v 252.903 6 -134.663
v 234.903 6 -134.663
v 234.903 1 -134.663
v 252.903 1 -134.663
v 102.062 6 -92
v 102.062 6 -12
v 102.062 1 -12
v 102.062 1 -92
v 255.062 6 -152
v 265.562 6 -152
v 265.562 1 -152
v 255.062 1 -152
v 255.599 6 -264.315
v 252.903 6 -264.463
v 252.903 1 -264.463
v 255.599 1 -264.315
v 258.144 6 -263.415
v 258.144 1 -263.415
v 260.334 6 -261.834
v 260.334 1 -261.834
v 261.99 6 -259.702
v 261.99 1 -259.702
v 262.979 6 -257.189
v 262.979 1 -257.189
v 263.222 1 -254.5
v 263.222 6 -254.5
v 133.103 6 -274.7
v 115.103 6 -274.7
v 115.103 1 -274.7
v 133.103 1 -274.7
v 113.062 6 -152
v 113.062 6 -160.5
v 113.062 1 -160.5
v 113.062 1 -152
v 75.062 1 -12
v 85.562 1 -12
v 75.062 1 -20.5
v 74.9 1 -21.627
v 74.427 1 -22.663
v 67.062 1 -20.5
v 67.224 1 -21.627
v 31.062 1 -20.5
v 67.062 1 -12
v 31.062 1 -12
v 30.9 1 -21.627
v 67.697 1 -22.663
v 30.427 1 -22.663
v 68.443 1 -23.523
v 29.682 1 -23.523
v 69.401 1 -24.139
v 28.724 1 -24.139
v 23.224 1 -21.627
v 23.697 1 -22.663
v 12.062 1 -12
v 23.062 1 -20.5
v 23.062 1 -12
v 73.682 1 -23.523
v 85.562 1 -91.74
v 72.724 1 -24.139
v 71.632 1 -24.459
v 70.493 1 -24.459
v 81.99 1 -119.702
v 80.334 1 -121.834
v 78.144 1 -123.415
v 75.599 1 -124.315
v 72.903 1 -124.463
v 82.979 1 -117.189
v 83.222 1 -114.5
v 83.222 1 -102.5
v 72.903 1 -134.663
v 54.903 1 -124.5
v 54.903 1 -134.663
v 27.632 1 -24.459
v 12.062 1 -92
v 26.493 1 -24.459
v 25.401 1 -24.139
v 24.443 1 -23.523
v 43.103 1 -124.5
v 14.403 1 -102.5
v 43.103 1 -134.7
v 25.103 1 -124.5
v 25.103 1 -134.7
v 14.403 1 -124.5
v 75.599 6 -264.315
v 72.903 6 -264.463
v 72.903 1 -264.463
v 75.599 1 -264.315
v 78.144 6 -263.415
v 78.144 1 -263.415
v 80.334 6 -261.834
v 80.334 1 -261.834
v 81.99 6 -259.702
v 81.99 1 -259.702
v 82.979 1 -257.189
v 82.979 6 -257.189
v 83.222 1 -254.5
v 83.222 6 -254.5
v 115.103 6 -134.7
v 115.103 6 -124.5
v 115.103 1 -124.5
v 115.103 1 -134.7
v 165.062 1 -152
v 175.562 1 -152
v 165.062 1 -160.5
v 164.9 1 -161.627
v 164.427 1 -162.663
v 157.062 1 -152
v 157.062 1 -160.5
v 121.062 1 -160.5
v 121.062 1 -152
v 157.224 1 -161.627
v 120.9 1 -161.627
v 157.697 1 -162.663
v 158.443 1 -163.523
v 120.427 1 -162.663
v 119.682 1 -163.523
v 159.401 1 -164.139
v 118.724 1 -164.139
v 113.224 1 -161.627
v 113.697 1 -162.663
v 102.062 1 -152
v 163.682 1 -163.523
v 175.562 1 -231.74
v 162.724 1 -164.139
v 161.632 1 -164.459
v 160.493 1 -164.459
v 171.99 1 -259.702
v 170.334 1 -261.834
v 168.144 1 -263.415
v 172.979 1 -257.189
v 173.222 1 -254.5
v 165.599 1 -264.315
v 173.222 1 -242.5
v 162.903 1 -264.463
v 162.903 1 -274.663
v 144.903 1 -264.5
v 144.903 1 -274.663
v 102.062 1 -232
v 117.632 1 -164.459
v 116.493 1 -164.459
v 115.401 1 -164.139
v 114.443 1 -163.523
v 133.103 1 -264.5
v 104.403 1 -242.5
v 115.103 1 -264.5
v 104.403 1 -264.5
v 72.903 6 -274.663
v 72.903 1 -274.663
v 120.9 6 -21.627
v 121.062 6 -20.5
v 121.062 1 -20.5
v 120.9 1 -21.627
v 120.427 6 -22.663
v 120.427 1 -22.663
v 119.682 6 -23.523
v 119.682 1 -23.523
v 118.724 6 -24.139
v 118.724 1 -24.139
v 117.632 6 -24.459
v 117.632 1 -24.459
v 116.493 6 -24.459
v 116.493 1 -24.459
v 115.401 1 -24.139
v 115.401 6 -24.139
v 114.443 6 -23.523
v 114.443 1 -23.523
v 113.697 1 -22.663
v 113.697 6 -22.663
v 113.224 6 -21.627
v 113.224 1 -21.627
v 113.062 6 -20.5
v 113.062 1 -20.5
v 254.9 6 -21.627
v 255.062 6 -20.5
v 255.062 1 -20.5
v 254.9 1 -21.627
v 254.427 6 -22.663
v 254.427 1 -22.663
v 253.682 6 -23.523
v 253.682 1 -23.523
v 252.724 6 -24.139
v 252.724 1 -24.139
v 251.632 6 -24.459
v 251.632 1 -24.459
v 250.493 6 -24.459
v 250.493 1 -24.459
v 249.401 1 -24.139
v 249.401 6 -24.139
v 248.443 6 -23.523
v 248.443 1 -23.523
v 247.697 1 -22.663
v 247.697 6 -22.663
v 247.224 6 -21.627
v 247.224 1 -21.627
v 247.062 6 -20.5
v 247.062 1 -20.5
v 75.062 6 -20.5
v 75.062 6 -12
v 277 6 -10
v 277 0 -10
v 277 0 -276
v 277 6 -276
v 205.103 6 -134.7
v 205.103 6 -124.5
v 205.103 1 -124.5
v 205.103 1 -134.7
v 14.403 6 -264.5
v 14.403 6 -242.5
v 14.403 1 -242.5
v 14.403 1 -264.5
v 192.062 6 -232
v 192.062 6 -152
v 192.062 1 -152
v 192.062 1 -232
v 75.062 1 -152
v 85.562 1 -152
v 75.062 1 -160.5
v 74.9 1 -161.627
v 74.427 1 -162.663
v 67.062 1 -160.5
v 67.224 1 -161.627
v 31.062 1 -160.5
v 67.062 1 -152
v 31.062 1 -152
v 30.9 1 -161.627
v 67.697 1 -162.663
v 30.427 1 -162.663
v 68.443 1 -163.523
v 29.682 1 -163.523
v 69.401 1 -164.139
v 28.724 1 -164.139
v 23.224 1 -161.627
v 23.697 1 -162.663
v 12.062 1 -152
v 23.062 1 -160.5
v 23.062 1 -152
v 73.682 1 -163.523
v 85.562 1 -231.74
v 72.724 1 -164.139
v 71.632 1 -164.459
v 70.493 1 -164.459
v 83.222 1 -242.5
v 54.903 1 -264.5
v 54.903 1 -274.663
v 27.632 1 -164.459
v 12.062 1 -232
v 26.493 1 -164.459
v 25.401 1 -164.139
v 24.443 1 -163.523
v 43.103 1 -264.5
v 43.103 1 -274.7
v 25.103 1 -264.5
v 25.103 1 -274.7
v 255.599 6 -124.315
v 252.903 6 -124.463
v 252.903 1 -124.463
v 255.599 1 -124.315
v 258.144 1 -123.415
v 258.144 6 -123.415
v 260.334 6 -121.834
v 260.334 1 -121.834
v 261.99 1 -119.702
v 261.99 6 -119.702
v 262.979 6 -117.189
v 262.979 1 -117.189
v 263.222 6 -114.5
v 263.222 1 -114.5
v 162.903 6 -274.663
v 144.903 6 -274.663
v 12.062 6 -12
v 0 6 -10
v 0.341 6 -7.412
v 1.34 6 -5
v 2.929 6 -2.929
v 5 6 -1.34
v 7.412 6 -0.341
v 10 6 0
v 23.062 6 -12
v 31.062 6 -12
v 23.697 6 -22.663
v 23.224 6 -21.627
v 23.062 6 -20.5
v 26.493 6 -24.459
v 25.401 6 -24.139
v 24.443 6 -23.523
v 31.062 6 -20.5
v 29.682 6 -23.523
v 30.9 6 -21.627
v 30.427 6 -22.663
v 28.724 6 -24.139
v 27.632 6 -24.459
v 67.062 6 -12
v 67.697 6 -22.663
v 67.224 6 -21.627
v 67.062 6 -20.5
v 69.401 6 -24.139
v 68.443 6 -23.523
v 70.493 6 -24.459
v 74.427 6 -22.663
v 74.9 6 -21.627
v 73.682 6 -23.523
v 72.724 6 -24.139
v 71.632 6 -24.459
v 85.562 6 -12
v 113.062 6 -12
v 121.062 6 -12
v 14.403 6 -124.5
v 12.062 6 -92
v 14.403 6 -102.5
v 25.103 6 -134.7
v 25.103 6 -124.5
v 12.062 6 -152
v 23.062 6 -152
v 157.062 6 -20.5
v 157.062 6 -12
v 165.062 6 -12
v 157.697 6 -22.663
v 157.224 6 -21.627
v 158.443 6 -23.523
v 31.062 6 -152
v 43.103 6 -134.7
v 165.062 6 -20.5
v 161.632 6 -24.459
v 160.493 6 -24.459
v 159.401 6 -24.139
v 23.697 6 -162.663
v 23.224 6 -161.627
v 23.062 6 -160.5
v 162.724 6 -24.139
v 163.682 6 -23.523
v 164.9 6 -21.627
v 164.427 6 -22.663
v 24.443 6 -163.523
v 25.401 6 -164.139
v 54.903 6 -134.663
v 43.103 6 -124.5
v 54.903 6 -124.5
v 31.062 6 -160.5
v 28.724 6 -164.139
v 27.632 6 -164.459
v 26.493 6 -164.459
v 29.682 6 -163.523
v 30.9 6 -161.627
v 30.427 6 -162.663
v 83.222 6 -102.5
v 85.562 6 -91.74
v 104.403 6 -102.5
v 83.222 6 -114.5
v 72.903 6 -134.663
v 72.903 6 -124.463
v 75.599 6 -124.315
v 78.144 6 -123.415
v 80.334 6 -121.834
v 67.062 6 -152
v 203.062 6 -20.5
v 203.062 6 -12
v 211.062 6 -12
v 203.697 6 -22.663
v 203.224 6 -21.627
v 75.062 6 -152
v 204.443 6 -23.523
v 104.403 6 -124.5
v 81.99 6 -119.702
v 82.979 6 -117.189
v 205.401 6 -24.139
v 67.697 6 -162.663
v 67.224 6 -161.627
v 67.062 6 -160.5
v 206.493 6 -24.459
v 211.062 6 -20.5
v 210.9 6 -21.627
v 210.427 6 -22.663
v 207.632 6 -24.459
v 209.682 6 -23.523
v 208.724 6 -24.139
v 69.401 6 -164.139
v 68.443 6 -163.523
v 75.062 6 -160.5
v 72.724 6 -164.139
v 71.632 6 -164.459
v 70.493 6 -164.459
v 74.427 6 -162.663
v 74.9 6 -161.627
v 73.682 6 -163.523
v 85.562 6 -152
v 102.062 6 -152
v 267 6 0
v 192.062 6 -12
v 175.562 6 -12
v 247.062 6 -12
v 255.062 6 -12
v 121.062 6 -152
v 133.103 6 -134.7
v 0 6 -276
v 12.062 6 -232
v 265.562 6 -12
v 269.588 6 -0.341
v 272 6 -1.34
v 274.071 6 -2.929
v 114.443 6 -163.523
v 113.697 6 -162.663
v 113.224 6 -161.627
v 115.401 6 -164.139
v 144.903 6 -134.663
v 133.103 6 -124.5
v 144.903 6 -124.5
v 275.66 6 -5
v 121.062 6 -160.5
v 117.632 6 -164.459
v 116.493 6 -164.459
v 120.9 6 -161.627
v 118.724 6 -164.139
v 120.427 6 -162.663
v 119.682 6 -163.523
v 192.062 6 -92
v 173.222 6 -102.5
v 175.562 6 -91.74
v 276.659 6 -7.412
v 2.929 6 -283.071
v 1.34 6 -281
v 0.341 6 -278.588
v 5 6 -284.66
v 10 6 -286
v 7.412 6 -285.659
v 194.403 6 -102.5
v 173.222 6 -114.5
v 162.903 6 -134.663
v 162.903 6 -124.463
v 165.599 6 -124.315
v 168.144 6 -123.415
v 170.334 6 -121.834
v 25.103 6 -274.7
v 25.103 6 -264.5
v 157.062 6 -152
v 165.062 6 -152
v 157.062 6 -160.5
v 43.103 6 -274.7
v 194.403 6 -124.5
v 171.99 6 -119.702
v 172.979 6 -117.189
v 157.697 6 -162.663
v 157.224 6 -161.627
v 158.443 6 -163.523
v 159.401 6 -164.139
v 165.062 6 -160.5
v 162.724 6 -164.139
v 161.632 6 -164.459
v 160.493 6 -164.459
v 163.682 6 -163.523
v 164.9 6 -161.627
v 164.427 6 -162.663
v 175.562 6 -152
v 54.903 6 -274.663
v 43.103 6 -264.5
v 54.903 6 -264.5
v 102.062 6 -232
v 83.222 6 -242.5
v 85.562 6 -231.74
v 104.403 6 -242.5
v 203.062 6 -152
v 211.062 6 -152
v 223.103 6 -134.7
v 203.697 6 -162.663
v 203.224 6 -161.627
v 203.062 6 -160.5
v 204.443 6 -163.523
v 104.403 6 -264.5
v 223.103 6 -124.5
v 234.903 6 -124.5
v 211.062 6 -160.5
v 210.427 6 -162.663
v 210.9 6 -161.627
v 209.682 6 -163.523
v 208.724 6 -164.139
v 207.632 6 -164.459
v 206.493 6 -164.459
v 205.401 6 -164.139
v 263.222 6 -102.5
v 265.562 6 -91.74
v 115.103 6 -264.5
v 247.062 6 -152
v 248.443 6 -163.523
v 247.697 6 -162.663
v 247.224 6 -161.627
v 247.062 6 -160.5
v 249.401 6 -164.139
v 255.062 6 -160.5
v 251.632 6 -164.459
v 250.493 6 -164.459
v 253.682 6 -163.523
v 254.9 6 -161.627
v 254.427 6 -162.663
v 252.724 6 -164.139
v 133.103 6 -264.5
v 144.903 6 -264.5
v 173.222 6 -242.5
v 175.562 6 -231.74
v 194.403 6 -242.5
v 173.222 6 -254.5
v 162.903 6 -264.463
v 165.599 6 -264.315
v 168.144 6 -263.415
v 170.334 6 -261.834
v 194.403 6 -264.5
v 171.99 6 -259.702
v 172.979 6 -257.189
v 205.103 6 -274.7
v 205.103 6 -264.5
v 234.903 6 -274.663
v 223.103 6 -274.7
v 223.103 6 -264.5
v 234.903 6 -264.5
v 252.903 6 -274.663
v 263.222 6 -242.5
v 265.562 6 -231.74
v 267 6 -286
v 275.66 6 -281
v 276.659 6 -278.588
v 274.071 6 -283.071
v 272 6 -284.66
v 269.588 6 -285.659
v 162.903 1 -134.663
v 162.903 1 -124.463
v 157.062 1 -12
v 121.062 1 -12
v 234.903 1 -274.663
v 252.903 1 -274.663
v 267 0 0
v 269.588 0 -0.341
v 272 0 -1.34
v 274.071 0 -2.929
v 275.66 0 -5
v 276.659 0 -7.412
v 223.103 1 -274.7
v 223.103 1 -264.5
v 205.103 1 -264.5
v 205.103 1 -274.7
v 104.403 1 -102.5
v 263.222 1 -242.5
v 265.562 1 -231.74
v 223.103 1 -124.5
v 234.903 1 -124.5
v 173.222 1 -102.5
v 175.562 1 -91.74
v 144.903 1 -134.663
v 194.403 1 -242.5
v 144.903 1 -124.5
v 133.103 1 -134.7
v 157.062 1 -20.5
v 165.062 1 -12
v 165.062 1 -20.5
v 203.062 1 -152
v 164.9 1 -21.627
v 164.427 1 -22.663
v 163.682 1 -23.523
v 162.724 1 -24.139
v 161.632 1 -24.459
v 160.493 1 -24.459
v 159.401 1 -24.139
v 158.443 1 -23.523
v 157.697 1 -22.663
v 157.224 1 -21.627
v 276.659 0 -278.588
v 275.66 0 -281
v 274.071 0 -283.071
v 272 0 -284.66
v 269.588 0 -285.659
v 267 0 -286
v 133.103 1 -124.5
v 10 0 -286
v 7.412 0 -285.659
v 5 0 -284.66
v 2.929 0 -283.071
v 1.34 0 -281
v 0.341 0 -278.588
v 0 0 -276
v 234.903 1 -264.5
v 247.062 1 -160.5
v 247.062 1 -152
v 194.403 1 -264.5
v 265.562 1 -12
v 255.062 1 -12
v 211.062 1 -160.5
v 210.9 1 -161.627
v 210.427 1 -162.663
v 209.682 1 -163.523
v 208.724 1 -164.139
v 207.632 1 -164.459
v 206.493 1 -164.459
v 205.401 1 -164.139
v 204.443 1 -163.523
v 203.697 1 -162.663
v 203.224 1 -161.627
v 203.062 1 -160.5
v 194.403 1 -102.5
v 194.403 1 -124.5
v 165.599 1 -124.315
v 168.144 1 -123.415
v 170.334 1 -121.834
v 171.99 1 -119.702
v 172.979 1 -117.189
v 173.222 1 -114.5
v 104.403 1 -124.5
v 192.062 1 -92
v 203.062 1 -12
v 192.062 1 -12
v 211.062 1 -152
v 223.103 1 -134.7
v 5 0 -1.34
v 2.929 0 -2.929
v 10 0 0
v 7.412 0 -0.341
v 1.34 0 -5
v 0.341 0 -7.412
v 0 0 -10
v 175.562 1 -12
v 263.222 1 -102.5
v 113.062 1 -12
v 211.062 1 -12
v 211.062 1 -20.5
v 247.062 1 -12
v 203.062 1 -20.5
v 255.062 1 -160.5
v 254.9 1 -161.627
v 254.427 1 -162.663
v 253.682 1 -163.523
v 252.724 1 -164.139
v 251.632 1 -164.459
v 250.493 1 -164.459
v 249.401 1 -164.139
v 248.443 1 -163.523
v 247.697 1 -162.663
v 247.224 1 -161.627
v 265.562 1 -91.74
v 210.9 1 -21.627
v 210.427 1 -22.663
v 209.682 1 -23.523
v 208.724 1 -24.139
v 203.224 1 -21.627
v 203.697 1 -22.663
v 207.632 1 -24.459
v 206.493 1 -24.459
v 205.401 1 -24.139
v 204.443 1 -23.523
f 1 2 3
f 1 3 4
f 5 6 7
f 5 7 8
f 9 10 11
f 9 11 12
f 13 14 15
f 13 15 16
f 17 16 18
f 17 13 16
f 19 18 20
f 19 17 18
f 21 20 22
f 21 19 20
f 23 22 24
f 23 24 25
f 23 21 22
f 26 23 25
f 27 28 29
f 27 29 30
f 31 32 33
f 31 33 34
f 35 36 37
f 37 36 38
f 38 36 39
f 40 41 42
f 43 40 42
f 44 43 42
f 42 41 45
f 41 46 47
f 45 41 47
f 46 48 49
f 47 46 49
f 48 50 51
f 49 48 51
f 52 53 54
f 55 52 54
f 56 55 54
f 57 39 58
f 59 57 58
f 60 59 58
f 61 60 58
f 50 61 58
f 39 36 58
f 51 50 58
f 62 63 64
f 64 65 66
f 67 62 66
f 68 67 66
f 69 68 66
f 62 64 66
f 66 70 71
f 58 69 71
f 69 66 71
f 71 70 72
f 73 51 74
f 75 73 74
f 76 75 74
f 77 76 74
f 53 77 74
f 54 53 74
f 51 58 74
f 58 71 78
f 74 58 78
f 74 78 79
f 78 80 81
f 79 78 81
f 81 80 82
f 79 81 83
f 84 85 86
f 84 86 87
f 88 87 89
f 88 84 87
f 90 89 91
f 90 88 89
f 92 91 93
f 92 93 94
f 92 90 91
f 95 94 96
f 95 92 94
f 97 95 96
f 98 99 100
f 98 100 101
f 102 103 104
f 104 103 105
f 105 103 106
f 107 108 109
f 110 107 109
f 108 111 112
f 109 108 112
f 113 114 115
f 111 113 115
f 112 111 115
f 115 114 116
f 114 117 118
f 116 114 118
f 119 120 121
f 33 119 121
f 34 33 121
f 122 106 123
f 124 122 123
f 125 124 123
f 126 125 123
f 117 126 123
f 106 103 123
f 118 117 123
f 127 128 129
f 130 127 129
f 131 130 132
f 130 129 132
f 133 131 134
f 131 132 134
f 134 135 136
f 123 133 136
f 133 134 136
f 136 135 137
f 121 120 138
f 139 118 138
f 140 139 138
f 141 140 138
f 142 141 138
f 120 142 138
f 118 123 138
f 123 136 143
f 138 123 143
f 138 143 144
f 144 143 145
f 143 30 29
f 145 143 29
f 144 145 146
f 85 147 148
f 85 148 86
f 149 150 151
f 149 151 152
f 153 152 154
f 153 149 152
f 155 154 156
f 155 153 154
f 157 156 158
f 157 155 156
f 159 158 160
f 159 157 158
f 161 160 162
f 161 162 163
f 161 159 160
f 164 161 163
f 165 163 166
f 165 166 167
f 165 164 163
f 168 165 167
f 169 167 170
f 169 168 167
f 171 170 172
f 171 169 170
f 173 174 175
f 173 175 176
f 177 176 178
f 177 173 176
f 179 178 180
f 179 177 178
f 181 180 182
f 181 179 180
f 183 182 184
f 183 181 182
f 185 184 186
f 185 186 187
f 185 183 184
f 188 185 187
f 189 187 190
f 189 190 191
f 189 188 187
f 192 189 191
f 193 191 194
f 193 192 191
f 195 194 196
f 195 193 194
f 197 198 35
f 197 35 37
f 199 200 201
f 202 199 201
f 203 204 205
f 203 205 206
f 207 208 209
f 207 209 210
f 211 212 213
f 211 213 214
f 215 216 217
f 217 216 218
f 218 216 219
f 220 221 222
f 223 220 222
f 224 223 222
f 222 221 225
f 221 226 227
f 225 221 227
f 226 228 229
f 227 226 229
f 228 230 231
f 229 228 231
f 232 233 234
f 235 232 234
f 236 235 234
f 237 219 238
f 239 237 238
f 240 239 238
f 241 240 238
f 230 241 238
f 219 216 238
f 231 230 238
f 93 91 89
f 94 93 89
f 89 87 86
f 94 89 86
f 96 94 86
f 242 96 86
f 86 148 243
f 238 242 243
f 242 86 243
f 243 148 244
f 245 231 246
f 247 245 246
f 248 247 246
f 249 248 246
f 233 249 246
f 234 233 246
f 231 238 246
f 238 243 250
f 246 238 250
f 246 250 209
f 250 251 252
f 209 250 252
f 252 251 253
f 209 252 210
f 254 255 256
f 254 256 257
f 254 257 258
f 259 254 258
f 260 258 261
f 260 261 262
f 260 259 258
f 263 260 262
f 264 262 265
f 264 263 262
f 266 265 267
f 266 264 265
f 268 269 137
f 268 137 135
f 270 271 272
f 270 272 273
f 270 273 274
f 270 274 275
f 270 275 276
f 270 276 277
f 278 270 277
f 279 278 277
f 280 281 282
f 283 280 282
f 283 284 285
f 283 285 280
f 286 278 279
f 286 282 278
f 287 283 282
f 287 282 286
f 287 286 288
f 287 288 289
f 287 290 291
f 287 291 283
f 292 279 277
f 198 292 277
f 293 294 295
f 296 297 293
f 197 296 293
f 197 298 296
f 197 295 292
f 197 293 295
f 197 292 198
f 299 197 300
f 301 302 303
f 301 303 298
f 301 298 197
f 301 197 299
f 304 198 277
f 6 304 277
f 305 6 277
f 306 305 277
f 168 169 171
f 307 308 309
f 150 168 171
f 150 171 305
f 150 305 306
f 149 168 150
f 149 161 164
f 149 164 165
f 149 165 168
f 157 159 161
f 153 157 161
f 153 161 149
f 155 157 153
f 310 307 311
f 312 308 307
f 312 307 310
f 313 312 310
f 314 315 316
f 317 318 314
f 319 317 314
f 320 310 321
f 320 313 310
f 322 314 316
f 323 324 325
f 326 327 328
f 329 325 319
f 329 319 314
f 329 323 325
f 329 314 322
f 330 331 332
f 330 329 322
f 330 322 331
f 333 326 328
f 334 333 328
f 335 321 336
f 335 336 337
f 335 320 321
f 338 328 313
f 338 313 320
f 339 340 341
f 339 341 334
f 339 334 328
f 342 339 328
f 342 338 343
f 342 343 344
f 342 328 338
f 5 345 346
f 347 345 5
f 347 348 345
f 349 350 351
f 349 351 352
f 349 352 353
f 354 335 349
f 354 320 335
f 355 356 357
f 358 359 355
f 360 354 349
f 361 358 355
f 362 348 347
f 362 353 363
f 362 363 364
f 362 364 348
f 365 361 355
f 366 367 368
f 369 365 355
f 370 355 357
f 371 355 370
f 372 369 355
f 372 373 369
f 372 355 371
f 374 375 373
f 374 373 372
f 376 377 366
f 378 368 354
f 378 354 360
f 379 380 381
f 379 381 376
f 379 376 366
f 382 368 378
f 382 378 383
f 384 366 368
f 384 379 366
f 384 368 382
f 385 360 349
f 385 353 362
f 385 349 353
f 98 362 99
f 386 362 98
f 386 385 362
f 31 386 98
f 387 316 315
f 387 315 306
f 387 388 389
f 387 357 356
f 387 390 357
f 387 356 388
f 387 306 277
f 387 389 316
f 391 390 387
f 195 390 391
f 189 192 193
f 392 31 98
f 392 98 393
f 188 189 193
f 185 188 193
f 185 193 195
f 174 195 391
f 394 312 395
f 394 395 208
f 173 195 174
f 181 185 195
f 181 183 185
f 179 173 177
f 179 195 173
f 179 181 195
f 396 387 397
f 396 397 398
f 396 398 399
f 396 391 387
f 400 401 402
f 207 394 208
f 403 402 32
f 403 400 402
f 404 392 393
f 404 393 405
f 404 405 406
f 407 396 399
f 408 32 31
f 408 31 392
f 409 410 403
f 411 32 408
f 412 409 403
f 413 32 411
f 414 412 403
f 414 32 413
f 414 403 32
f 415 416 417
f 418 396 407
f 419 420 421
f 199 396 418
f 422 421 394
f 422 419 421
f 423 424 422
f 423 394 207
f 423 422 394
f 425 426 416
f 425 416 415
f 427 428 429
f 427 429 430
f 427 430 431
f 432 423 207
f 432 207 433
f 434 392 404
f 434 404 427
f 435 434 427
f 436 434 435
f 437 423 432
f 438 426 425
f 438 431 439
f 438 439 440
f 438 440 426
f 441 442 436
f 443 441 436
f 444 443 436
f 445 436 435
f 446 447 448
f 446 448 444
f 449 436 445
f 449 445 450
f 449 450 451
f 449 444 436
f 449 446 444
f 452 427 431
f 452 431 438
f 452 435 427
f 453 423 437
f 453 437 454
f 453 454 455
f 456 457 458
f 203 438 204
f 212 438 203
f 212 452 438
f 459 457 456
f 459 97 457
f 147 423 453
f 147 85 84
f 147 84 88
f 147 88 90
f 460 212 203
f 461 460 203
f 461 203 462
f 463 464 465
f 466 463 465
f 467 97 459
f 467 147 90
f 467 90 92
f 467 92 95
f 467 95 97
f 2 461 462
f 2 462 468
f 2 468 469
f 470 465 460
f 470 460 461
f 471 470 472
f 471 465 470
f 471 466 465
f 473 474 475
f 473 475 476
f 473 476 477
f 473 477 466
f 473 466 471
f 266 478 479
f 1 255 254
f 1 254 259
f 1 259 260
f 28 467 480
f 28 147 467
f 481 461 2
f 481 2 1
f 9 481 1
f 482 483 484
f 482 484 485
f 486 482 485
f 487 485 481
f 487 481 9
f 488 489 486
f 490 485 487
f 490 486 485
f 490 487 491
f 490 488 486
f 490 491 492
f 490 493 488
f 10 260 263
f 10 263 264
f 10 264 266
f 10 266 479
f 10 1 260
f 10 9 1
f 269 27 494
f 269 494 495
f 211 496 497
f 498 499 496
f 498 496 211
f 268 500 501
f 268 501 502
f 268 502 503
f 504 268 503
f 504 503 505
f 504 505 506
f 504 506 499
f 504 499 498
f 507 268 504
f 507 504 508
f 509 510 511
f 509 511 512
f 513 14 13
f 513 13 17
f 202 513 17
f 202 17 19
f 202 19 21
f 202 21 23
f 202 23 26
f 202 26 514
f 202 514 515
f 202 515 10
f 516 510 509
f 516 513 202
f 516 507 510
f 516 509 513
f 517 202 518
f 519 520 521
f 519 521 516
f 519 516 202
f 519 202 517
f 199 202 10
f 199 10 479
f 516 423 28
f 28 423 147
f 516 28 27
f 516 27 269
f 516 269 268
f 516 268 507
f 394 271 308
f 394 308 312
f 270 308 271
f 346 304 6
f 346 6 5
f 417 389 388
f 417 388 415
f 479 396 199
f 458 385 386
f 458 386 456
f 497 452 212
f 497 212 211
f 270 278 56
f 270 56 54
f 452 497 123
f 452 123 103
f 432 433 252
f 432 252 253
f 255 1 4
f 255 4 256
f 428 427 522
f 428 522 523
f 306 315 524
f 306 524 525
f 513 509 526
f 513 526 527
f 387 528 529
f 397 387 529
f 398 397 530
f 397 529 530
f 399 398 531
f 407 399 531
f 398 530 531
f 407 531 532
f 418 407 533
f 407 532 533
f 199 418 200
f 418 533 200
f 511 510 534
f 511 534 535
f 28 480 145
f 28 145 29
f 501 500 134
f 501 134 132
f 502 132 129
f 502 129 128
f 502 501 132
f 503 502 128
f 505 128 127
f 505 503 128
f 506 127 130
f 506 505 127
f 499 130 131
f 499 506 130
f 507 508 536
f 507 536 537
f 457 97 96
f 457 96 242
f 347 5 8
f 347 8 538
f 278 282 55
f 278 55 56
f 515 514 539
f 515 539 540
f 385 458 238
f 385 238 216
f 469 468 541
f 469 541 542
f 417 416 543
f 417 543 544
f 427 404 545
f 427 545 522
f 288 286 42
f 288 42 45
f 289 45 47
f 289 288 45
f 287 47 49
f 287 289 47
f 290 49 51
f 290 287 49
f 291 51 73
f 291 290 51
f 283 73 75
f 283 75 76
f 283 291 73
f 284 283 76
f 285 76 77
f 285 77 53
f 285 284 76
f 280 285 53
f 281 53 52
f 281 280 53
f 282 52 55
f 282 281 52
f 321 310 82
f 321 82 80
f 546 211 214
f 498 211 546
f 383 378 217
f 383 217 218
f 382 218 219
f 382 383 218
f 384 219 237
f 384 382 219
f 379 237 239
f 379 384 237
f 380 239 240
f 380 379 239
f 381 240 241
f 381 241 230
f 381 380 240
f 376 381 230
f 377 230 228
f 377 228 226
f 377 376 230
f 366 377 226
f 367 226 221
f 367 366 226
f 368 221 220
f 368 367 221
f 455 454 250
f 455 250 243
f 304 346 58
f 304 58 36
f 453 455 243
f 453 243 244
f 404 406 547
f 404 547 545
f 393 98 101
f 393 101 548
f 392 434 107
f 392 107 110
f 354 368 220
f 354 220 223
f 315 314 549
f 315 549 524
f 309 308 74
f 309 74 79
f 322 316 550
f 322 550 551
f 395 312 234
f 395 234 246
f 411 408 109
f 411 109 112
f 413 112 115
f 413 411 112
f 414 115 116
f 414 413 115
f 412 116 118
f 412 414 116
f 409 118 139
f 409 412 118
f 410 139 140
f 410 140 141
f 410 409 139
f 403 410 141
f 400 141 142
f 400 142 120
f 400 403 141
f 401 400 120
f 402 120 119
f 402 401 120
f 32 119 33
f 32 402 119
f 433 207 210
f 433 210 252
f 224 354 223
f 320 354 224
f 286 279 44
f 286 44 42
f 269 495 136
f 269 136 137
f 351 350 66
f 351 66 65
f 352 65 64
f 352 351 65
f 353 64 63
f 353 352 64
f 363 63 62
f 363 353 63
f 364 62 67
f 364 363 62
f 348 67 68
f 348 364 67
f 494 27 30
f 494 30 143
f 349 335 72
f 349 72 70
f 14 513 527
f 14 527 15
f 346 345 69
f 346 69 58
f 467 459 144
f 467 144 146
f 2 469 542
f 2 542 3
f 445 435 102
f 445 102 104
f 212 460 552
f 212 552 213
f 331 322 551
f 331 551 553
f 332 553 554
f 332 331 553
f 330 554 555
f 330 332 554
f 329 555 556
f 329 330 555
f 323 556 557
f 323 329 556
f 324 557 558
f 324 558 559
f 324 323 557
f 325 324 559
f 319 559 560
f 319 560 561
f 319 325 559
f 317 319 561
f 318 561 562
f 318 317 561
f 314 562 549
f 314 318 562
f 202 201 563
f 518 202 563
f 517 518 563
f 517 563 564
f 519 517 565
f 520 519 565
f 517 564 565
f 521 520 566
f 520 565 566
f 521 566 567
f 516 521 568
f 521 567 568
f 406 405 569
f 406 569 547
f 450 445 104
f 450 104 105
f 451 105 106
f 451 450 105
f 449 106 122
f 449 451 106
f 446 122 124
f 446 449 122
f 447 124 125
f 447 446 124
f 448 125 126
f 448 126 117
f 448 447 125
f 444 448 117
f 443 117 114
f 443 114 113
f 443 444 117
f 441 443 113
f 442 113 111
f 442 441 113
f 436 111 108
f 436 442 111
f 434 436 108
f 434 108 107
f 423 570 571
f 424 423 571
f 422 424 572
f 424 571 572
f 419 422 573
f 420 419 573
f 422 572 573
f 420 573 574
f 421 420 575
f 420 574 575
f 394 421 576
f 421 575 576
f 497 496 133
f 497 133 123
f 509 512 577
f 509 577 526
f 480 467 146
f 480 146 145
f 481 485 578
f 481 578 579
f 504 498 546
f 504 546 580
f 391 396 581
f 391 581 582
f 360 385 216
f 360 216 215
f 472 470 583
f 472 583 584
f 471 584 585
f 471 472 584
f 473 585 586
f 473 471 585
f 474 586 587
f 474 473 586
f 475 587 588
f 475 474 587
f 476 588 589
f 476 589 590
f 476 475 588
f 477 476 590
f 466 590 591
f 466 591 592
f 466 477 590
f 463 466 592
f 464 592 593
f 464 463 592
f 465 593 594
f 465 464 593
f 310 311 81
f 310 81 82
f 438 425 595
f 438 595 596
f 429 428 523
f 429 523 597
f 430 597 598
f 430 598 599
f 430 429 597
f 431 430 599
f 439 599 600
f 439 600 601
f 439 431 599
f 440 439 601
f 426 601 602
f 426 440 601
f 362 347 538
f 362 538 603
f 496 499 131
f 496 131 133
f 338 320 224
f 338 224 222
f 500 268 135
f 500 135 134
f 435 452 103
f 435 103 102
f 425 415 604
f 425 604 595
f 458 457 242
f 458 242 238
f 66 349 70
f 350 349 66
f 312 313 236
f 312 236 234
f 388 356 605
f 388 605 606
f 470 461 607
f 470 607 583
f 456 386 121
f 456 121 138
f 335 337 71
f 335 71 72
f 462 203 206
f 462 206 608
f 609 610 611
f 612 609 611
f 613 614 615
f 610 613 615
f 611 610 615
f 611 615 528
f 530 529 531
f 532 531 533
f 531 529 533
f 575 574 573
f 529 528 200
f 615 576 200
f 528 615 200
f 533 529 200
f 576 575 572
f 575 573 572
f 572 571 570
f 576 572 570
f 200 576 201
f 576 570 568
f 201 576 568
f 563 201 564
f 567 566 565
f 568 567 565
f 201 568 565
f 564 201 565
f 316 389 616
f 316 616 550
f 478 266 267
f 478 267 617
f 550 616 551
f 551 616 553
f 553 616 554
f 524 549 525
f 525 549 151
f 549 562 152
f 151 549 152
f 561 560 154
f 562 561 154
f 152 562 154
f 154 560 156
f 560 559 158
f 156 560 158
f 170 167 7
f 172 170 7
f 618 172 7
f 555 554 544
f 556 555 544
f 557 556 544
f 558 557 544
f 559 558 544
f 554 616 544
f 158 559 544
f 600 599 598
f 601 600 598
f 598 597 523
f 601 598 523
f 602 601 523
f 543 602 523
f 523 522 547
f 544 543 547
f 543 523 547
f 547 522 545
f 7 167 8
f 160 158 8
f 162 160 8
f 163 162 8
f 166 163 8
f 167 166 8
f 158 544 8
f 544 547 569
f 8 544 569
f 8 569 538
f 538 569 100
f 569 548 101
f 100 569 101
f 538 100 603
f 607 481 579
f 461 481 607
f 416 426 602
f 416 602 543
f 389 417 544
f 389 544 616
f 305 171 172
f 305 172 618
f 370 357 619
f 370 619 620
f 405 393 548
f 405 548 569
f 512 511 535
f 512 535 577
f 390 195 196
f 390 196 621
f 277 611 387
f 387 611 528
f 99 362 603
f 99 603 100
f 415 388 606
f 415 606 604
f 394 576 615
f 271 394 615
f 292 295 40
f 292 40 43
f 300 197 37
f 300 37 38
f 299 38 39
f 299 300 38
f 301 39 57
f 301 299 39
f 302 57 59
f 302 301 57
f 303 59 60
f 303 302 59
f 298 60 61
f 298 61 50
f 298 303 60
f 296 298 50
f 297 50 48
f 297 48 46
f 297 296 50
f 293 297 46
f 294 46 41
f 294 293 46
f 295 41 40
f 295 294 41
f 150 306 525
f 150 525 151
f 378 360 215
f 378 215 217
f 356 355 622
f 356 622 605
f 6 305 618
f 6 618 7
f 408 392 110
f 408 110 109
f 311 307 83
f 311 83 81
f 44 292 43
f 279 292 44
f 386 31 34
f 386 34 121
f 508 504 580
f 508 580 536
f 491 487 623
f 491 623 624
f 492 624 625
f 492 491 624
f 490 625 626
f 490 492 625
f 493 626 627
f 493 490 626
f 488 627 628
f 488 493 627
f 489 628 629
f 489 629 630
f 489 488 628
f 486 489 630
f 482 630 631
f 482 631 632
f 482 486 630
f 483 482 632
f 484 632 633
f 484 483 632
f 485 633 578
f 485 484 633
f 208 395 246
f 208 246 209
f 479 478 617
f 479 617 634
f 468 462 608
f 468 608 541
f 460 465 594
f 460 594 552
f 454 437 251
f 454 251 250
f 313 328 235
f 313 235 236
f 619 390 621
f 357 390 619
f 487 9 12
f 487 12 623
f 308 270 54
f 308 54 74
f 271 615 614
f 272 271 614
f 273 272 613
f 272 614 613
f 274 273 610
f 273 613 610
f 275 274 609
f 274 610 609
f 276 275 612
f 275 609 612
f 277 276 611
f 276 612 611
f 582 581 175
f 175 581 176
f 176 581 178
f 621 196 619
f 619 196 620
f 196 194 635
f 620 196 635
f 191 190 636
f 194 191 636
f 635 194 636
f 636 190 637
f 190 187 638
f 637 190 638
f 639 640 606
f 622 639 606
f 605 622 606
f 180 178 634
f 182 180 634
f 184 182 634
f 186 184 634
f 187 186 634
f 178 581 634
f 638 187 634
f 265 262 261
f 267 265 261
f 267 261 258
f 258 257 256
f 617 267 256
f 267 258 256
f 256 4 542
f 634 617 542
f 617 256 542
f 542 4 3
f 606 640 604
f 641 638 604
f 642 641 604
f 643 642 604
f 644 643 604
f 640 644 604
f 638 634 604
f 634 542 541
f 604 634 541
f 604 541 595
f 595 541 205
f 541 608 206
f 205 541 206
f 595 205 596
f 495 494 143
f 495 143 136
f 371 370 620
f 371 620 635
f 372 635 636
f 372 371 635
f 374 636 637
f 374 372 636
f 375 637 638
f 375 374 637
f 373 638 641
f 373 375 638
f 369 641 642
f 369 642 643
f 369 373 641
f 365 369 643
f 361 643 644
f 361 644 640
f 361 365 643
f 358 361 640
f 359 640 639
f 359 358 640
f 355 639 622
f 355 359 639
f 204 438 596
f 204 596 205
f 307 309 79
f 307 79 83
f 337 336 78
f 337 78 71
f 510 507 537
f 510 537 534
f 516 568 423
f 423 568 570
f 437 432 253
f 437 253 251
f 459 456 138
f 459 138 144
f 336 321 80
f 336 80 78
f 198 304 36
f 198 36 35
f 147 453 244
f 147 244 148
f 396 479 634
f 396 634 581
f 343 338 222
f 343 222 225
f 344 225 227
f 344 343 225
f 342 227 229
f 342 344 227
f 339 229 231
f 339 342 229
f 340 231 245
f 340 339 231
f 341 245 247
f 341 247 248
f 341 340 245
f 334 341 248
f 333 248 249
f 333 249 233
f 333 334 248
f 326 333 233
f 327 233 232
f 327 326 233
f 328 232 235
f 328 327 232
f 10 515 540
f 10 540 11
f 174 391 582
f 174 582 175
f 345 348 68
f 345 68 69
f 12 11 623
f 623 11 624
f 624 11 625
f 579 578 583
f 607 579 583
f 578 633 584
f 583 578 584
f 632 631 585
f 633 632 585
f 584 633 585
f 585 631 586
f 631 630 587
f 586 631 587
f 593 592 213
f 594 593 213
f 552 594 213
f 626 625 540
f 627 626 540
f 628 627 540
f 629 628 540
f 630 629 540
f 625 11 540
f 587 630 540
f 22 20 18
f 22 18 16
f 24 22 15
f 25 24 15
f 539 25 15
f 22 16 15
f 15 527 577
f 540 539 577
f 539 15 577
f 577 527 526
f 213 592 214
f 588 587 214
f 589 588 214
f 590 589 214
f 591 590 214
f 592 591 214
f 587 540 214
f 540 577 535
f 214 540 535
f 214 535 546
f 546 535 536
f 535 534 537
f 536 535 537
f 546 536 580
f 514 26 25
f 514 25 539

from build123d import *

# Parameters (mm, degrees)
BOSS_EXTRUDE1_DEPTH = 6
CUT_EXTRUDE1_DEPTH  = 5


with BuildPart() as part:
    # Sketch1 → Boss-Extrude1 (new body)
    with BuildSketch(Plane(origin=(0, 0, 0), x_dir=(1, 0, 0), z_dir=(0, 1, 0))):
        with BuildLine():
            Line((10, 0), (267, 0))
            ThreePointArc((267, 0), (274.071067812, 2.928932188), (277, 10))
            Line((277, 10), (277, 276))
            ThreePointArc((277, 276), (274.071067812, 283.071067812), (267, 286))
            Line((267, 286), (10, 286))
            ThreePointArc((10, 286), (2.928932188, 283.071067812), (0, 276))
            Line((0, 276), (0, 10))
            ThreePointArc((0, 10), (2.928932188, 2.928932188), (10, 0))
        make_face()
    extrude(amount=BOSS_EXTRUDE1_DEPTH)

    # Sketch2 → Cut-Extrude1 (cut)
    with BuildSketch(Plane(origin=(0, 6, 0), x_dir=(1, 0, 0), z_dir=(0, 1, 0))):
        with BuildLine():
            Line((12.062245302, 92), (14.402743297, 102.5))
            Line((14.402743297, 102.5), (14.402743297, 124.5))
            Line((14.402743297, 124.5), (25.102743297, 124.5))
            Line((25.102743297, 124.5), (25.102743297, 134.7))
            Line((25.102743297, 134.7), (43.102743297, 134.7))
            Line((43.102743297, 134.7), (43.102743297, 124.5))
            Line((43.102743297, 124.5), (54.902731898, 124.5))
            Line((54.902731898, 124.5), (54.902731898, 134.663480988))
            Line((54.902731898, 134.663480988), (72.902731898, 134.663480988))
            Line((72.902731898, 134.663480988), (72.902731898, 124.463480988))
            ThreePointArc((72.902731898, 124.463480988), (80.333662874, 121.834216678), (83.221747307, 114.5))
            Line((83.221747307, 114.5), (83.221747307, 102.5))
            Line((83.221747307, 102.5), (85.562245302, 91.74))
            Line((85.562245302, 91.74), (85.562245302, 12))
            Line((85.562245302, 12), (75.062245302, 12))
            Line((75.062245302, 12), (75.062245302, 20.5))
            ThreePointArc((75.062245302, 20.5), (71.062245302, 24.5), (67.062245302, 20.5))
            Line((67.062245302, 20.5), (67.062245302, 12))
            Line((67.062245302, 12), (31.062245302, 12))
            Line((31.062245302, 12), (31.062245302, 20.5))
            ThreePointArc((31.062245302, 20.5), (27.062245302, 24.5), (23.062245302, 20.5))
            Line((23.062245302, 20.5), (23.062245302, 12))
            Line((23.062245302, 12), (12.062245302, 12))
            Line((12.062245302, 12), (12.062245302, 92))
        make_face()
        with BuildLine():
            Line((102.062245302, 92), (104.402743297, 102.5))
            Line((104.402743297, 102.5), (104.402743297, 124.5))
            Line((104.402743297, 124.5), (115.102743297, 124.5))
            Line((115.102743297, 124.5), (115.102743297, 134.7))
            Line((115.102743297, 134.7), (133.102743297, 134.7))
            Line((133.102743297, 134.7), (133.102743297, 124.5))
            Line((133.102743297, 124.5), (144.902731898, 124.5))
            Line((144.902731898, 124.5), (144.902731898, 134.663480988))
            Line((144.902731898, 134.663480988), (162.902731898, 134.663480988))
            Line((162.902731898, 134.663480988), (162.902731898, 124.463480988))
            ThreePointArc((162.902731898, 124.463480988), (170.333662874, 121.834216678), (173.221747307, 114.5))
            Line((173.221747307, 114.5), (173.221747307, 102.5))
            Line((173.221747307, 102.5), (175.562245302, 91.74))
            Line((175.562245302, 91.74), (175.562245302, 12))
            Line((175.562245302, 12), (165.062245302, 12))
            Line((165.062245302, 12), (165.062245302, 20.5))
            ThreePointArc((165.062245302, 20.5), (161.062245302, 24.5), (157.062245302, 20.5))
            Line((157.062245302, 20.5), (157.062245302, 12))
            Line((157.062245302, 12), (121.062245302, 12))
            Line((121.062245302, 12), (121.062245302, 20.5))
            ThreePointArc((121.062245302, 20.5), (117.062245302, 24.5), (113.062245302, 20.5))
            Line((113.062245302, 20.5), (113.062245302, 12))
            Line((113.062245302, 12), (102.062245302, 12))
            Line((102.062245302, 12), (102.062245302, 92))
        make_face()
        with BuildLine():
            Line((192.062245302, 92), (194.402743297, 102.5))
            Line((194.402743297, 102.5), (194.402743297, 124.5))
            Line((194.402743297, 124.5), (205.102743297, 124.5))
            Line((205.102743297, 124.5), (205.102743297, 134.7))
            Line((205.102743297, 134.7), (223.102743297, 134.7))
            Line((223.102743297, 134.7), (223.102743297, 124.5))
            Line((223.102743297, 124.5), (234.902731898, 124.5))
            Line((234.902731898, 124.5), (234.902731898, 134.663480988))
            Line((234.902731898, 134.663480988), (252.902731898, 134.663480988))
            Line((252.902731898, 134.663480988), (252.902731898, 124.463480988))
            ThreePointArc((252.902731898, 124.463480988), (260.333662874, 121.834216678), (263.221747307, 114.5))
            Line((263.221747307, 114.5), (263.221747307, 102.5))
            Line((263.221747307, 102.5), (265.562245302, 91.74))
            Line((265.562245302, 91.74), (265.562245302, 12))
            Line((265.562245302, 12), (255.062245302, 12))
            Line((255.062245302, 12), (255.062245302, 20.5))
            ThreePointArc((255.062245302, 20.5), (251.062245302, 24.5), (247.062245302, 20.5))
            Line((247.062245302, 20.5), (247.062245302, 12))
            Line((247.062245302, 12), (211.062245302, 12))
            Line((211.062245302, 12), (211.062245302, 20.5))
            ThreePointArc((211.062245302, 20.5), (207.062245302, 24.5), (203.062245302, 20.5))
            Line((203.062245302, 20.5), (203.062245302, 12))
            Line((203.062245302, 12), (192.062245302, 12))
            Line((192.062245302, 12), (192.062245302, 92))
        make_face()
        with BuildLine():
            Line((102.062245302, 232), (104.402743297, 242.5))
            Line((104.402743297, 242.5), (104.402743297, 264.5))
            Line((104.402743297, 264.5), (115.102743297, 264.5))
            Line((115.102743297, 264.5), (115.102743297, 274.7))
            Line((115.102743297, 274.7), (133.102743297, 274.7))
            Line((133.102743297, 274.7), (133.102743297, 264.5))
            Line((133.102743297, 264.5), (144.902731898, 264.5))
            Line((144.902731898, 264.5), (144.902731898, 274.663480988))
            Line((144.902731898, 274.663480988), (162.902731898, 274.663480988))
            Line((162.902731898, 274.663480988), (162.902731898, 264.463480988))
            ThreePointArc((162.902731898, 264.463480988), (170.333662874, 261.834216678), (173.221747307, 254.5))
            Line((173.221747307, 254.5), (173.221747307, 242.5))
            Line((173.221747307, 242.5), (175.562245302, 231.74))
            Line((175.562245302, 231.74), (175.562245302, 152))
            Line((175.562245302, 152), (165.062245302, 152))
            Line((165.062245302, 152), (165.062245302, 160.5))
            ThreePointArc((165.062245302, 160.5), (161.062245302, 164.5), (157.062245302, 160.5))
            Line((157.062245302, 160.5), (157.062245302, 152))
            Line((157.062245302, 152), (121.062245302, 152))
            Line((121.062245302, 152), (121.062245302, 160.5))
            ThreePointArc((121.062245302, 160.5), (117.062245302, 164.5), (113.062245302, 160.5))
            Line((113.062245302, 160.5), (113.062245302, 152))
            Line((113.062245302, 152), (102.062245302, 152))
            Line((102.062245302, 152), (102.062245302, 232))
        make_face()
        with BuildLine():
            Line((192.062245302, 232), (194.402743297, 242.5))
            Line((194.402743297, 242.5), (194.402743297, 264.5))
            Line((194.402743297, 264.5), (205.102743297, 264.5))
            Line((205.102743297, 264.5), (205.102743297, 274.7))
            Line((205.102743297, 274.7), (223.102743297, 274.7))
            Line((223.102743297, 274.7), (223.102743297, 264.5))
            Line((223.102743297, 264.5), (234.902731898, 264.5))
            Line((234.902731898, 264.5), (234.902731898, 274.663480988))
            Line((234.902731898, 274.663480988), (252.902731898, 274.663480988))
            Line((252.902731898, 274.663480988), (252.902731898, 264.463480988))
            ThreePointArc((252.902731898, 264.463480988), (260.333662874, 261.834216678), (263.221747307, 254.5))
            Line((263.221747307, 254.5), (263.221747307, 242.5))
            Line((263.221747307, 242.5), (265.562245302, 231.74))
            Line((265.562245302, 231.74), (265.562245302, 152))
            Line((265.562245302, 152), (255.062245302, 152))
            Line((255.062245302, 152), (255.062245302, 160.5))
            ThreePointArc((255.062245302, 160.5), (251.062245302, 164.5), (247.062245302, 160.5))
            Line((247.062245302, 160.5), (247.062245302, 152))
            Line((247.062245302, 152), (211.062245302, 152))
            Line((211.062245302, 152), (211.062245302, 160.5))
            ThreePointArc((211.062245302, 160.5), (207.062245302, 164.5), (203.062245302, 160.5))
            Line((203.062245302, 160.5), (203.062245302, 152))
            Line((203.062245302, 152), (192.062245302, 152))
            Line((192.062245302, 152), (192.062245302, 232))
        make_face()
        with BuildLine():
            Line((12.062245302, 232), (14.402743297, 242.5))
            Line((14.402743297, 242.5), (14.402743297, 264.5))
            Line((14.402743297, 264.5), (25.102743297, 264.5))
            Line((25.102743297, 264.5), (25.102743297, 274.7))
            Line((25.102743297, 274.7), (43.102743297, 274.7))
            Line((43.102743297, 274.7), (43.102743297, 264.5))
            Line((43.102743297, 264.5), (54.902731898, 264.5))
            Line((54.902731898, 264.5), (54.902731898, 274.663480988))
            Line((54.902731898, 274.663480988), (72.902731898, 274.663480988))
            Line((72.902731898, 274.663480988), (72.902731898, 264.463480988))
            ThreePointArc((72.902731898, 264.463480988), (80.333662874, 261.834216678), (83.221747307, 254.5))
            Line((83.221747307, 254.5), (83.221747307, 242.5))
            Line((83.221747307, 242.5), (85.562245302, 231.74))
            Line((85.562245302, 231.74), (85.562245302, 152))
            Line((85.562245302, 152), (75.062245302, 152))
            Line((75.062245302, 152), (75.062245302, 160.5))
            ThreePointArc((75.062245302, 160.5), (71.062245302, 164.5), (67.062245302, 160.5))
            Line((67.062245302, 160.5), (67.062245302, 152))
            Line((67.062245302, 152), (31.062245302, 152))
            Line((31.062245302, 152), (31.062245302, 160.5))
            ThreePointArc((31.062245302, 160.5), (27.062245302, 164.5), (23.062245302, 160.5))
            Line((23.062245302, 160.5), (23.062245302, 152))
            Line((23.062245302, 152), (12.062245302, 152))
            Line((12.062245302, 152), (12.062245302, 232))
        make_face()
    extrude(amount=-CUT_EXTRUDE1_DEPTH, mode=Mode.SUBTRACT)


solid = part.part
